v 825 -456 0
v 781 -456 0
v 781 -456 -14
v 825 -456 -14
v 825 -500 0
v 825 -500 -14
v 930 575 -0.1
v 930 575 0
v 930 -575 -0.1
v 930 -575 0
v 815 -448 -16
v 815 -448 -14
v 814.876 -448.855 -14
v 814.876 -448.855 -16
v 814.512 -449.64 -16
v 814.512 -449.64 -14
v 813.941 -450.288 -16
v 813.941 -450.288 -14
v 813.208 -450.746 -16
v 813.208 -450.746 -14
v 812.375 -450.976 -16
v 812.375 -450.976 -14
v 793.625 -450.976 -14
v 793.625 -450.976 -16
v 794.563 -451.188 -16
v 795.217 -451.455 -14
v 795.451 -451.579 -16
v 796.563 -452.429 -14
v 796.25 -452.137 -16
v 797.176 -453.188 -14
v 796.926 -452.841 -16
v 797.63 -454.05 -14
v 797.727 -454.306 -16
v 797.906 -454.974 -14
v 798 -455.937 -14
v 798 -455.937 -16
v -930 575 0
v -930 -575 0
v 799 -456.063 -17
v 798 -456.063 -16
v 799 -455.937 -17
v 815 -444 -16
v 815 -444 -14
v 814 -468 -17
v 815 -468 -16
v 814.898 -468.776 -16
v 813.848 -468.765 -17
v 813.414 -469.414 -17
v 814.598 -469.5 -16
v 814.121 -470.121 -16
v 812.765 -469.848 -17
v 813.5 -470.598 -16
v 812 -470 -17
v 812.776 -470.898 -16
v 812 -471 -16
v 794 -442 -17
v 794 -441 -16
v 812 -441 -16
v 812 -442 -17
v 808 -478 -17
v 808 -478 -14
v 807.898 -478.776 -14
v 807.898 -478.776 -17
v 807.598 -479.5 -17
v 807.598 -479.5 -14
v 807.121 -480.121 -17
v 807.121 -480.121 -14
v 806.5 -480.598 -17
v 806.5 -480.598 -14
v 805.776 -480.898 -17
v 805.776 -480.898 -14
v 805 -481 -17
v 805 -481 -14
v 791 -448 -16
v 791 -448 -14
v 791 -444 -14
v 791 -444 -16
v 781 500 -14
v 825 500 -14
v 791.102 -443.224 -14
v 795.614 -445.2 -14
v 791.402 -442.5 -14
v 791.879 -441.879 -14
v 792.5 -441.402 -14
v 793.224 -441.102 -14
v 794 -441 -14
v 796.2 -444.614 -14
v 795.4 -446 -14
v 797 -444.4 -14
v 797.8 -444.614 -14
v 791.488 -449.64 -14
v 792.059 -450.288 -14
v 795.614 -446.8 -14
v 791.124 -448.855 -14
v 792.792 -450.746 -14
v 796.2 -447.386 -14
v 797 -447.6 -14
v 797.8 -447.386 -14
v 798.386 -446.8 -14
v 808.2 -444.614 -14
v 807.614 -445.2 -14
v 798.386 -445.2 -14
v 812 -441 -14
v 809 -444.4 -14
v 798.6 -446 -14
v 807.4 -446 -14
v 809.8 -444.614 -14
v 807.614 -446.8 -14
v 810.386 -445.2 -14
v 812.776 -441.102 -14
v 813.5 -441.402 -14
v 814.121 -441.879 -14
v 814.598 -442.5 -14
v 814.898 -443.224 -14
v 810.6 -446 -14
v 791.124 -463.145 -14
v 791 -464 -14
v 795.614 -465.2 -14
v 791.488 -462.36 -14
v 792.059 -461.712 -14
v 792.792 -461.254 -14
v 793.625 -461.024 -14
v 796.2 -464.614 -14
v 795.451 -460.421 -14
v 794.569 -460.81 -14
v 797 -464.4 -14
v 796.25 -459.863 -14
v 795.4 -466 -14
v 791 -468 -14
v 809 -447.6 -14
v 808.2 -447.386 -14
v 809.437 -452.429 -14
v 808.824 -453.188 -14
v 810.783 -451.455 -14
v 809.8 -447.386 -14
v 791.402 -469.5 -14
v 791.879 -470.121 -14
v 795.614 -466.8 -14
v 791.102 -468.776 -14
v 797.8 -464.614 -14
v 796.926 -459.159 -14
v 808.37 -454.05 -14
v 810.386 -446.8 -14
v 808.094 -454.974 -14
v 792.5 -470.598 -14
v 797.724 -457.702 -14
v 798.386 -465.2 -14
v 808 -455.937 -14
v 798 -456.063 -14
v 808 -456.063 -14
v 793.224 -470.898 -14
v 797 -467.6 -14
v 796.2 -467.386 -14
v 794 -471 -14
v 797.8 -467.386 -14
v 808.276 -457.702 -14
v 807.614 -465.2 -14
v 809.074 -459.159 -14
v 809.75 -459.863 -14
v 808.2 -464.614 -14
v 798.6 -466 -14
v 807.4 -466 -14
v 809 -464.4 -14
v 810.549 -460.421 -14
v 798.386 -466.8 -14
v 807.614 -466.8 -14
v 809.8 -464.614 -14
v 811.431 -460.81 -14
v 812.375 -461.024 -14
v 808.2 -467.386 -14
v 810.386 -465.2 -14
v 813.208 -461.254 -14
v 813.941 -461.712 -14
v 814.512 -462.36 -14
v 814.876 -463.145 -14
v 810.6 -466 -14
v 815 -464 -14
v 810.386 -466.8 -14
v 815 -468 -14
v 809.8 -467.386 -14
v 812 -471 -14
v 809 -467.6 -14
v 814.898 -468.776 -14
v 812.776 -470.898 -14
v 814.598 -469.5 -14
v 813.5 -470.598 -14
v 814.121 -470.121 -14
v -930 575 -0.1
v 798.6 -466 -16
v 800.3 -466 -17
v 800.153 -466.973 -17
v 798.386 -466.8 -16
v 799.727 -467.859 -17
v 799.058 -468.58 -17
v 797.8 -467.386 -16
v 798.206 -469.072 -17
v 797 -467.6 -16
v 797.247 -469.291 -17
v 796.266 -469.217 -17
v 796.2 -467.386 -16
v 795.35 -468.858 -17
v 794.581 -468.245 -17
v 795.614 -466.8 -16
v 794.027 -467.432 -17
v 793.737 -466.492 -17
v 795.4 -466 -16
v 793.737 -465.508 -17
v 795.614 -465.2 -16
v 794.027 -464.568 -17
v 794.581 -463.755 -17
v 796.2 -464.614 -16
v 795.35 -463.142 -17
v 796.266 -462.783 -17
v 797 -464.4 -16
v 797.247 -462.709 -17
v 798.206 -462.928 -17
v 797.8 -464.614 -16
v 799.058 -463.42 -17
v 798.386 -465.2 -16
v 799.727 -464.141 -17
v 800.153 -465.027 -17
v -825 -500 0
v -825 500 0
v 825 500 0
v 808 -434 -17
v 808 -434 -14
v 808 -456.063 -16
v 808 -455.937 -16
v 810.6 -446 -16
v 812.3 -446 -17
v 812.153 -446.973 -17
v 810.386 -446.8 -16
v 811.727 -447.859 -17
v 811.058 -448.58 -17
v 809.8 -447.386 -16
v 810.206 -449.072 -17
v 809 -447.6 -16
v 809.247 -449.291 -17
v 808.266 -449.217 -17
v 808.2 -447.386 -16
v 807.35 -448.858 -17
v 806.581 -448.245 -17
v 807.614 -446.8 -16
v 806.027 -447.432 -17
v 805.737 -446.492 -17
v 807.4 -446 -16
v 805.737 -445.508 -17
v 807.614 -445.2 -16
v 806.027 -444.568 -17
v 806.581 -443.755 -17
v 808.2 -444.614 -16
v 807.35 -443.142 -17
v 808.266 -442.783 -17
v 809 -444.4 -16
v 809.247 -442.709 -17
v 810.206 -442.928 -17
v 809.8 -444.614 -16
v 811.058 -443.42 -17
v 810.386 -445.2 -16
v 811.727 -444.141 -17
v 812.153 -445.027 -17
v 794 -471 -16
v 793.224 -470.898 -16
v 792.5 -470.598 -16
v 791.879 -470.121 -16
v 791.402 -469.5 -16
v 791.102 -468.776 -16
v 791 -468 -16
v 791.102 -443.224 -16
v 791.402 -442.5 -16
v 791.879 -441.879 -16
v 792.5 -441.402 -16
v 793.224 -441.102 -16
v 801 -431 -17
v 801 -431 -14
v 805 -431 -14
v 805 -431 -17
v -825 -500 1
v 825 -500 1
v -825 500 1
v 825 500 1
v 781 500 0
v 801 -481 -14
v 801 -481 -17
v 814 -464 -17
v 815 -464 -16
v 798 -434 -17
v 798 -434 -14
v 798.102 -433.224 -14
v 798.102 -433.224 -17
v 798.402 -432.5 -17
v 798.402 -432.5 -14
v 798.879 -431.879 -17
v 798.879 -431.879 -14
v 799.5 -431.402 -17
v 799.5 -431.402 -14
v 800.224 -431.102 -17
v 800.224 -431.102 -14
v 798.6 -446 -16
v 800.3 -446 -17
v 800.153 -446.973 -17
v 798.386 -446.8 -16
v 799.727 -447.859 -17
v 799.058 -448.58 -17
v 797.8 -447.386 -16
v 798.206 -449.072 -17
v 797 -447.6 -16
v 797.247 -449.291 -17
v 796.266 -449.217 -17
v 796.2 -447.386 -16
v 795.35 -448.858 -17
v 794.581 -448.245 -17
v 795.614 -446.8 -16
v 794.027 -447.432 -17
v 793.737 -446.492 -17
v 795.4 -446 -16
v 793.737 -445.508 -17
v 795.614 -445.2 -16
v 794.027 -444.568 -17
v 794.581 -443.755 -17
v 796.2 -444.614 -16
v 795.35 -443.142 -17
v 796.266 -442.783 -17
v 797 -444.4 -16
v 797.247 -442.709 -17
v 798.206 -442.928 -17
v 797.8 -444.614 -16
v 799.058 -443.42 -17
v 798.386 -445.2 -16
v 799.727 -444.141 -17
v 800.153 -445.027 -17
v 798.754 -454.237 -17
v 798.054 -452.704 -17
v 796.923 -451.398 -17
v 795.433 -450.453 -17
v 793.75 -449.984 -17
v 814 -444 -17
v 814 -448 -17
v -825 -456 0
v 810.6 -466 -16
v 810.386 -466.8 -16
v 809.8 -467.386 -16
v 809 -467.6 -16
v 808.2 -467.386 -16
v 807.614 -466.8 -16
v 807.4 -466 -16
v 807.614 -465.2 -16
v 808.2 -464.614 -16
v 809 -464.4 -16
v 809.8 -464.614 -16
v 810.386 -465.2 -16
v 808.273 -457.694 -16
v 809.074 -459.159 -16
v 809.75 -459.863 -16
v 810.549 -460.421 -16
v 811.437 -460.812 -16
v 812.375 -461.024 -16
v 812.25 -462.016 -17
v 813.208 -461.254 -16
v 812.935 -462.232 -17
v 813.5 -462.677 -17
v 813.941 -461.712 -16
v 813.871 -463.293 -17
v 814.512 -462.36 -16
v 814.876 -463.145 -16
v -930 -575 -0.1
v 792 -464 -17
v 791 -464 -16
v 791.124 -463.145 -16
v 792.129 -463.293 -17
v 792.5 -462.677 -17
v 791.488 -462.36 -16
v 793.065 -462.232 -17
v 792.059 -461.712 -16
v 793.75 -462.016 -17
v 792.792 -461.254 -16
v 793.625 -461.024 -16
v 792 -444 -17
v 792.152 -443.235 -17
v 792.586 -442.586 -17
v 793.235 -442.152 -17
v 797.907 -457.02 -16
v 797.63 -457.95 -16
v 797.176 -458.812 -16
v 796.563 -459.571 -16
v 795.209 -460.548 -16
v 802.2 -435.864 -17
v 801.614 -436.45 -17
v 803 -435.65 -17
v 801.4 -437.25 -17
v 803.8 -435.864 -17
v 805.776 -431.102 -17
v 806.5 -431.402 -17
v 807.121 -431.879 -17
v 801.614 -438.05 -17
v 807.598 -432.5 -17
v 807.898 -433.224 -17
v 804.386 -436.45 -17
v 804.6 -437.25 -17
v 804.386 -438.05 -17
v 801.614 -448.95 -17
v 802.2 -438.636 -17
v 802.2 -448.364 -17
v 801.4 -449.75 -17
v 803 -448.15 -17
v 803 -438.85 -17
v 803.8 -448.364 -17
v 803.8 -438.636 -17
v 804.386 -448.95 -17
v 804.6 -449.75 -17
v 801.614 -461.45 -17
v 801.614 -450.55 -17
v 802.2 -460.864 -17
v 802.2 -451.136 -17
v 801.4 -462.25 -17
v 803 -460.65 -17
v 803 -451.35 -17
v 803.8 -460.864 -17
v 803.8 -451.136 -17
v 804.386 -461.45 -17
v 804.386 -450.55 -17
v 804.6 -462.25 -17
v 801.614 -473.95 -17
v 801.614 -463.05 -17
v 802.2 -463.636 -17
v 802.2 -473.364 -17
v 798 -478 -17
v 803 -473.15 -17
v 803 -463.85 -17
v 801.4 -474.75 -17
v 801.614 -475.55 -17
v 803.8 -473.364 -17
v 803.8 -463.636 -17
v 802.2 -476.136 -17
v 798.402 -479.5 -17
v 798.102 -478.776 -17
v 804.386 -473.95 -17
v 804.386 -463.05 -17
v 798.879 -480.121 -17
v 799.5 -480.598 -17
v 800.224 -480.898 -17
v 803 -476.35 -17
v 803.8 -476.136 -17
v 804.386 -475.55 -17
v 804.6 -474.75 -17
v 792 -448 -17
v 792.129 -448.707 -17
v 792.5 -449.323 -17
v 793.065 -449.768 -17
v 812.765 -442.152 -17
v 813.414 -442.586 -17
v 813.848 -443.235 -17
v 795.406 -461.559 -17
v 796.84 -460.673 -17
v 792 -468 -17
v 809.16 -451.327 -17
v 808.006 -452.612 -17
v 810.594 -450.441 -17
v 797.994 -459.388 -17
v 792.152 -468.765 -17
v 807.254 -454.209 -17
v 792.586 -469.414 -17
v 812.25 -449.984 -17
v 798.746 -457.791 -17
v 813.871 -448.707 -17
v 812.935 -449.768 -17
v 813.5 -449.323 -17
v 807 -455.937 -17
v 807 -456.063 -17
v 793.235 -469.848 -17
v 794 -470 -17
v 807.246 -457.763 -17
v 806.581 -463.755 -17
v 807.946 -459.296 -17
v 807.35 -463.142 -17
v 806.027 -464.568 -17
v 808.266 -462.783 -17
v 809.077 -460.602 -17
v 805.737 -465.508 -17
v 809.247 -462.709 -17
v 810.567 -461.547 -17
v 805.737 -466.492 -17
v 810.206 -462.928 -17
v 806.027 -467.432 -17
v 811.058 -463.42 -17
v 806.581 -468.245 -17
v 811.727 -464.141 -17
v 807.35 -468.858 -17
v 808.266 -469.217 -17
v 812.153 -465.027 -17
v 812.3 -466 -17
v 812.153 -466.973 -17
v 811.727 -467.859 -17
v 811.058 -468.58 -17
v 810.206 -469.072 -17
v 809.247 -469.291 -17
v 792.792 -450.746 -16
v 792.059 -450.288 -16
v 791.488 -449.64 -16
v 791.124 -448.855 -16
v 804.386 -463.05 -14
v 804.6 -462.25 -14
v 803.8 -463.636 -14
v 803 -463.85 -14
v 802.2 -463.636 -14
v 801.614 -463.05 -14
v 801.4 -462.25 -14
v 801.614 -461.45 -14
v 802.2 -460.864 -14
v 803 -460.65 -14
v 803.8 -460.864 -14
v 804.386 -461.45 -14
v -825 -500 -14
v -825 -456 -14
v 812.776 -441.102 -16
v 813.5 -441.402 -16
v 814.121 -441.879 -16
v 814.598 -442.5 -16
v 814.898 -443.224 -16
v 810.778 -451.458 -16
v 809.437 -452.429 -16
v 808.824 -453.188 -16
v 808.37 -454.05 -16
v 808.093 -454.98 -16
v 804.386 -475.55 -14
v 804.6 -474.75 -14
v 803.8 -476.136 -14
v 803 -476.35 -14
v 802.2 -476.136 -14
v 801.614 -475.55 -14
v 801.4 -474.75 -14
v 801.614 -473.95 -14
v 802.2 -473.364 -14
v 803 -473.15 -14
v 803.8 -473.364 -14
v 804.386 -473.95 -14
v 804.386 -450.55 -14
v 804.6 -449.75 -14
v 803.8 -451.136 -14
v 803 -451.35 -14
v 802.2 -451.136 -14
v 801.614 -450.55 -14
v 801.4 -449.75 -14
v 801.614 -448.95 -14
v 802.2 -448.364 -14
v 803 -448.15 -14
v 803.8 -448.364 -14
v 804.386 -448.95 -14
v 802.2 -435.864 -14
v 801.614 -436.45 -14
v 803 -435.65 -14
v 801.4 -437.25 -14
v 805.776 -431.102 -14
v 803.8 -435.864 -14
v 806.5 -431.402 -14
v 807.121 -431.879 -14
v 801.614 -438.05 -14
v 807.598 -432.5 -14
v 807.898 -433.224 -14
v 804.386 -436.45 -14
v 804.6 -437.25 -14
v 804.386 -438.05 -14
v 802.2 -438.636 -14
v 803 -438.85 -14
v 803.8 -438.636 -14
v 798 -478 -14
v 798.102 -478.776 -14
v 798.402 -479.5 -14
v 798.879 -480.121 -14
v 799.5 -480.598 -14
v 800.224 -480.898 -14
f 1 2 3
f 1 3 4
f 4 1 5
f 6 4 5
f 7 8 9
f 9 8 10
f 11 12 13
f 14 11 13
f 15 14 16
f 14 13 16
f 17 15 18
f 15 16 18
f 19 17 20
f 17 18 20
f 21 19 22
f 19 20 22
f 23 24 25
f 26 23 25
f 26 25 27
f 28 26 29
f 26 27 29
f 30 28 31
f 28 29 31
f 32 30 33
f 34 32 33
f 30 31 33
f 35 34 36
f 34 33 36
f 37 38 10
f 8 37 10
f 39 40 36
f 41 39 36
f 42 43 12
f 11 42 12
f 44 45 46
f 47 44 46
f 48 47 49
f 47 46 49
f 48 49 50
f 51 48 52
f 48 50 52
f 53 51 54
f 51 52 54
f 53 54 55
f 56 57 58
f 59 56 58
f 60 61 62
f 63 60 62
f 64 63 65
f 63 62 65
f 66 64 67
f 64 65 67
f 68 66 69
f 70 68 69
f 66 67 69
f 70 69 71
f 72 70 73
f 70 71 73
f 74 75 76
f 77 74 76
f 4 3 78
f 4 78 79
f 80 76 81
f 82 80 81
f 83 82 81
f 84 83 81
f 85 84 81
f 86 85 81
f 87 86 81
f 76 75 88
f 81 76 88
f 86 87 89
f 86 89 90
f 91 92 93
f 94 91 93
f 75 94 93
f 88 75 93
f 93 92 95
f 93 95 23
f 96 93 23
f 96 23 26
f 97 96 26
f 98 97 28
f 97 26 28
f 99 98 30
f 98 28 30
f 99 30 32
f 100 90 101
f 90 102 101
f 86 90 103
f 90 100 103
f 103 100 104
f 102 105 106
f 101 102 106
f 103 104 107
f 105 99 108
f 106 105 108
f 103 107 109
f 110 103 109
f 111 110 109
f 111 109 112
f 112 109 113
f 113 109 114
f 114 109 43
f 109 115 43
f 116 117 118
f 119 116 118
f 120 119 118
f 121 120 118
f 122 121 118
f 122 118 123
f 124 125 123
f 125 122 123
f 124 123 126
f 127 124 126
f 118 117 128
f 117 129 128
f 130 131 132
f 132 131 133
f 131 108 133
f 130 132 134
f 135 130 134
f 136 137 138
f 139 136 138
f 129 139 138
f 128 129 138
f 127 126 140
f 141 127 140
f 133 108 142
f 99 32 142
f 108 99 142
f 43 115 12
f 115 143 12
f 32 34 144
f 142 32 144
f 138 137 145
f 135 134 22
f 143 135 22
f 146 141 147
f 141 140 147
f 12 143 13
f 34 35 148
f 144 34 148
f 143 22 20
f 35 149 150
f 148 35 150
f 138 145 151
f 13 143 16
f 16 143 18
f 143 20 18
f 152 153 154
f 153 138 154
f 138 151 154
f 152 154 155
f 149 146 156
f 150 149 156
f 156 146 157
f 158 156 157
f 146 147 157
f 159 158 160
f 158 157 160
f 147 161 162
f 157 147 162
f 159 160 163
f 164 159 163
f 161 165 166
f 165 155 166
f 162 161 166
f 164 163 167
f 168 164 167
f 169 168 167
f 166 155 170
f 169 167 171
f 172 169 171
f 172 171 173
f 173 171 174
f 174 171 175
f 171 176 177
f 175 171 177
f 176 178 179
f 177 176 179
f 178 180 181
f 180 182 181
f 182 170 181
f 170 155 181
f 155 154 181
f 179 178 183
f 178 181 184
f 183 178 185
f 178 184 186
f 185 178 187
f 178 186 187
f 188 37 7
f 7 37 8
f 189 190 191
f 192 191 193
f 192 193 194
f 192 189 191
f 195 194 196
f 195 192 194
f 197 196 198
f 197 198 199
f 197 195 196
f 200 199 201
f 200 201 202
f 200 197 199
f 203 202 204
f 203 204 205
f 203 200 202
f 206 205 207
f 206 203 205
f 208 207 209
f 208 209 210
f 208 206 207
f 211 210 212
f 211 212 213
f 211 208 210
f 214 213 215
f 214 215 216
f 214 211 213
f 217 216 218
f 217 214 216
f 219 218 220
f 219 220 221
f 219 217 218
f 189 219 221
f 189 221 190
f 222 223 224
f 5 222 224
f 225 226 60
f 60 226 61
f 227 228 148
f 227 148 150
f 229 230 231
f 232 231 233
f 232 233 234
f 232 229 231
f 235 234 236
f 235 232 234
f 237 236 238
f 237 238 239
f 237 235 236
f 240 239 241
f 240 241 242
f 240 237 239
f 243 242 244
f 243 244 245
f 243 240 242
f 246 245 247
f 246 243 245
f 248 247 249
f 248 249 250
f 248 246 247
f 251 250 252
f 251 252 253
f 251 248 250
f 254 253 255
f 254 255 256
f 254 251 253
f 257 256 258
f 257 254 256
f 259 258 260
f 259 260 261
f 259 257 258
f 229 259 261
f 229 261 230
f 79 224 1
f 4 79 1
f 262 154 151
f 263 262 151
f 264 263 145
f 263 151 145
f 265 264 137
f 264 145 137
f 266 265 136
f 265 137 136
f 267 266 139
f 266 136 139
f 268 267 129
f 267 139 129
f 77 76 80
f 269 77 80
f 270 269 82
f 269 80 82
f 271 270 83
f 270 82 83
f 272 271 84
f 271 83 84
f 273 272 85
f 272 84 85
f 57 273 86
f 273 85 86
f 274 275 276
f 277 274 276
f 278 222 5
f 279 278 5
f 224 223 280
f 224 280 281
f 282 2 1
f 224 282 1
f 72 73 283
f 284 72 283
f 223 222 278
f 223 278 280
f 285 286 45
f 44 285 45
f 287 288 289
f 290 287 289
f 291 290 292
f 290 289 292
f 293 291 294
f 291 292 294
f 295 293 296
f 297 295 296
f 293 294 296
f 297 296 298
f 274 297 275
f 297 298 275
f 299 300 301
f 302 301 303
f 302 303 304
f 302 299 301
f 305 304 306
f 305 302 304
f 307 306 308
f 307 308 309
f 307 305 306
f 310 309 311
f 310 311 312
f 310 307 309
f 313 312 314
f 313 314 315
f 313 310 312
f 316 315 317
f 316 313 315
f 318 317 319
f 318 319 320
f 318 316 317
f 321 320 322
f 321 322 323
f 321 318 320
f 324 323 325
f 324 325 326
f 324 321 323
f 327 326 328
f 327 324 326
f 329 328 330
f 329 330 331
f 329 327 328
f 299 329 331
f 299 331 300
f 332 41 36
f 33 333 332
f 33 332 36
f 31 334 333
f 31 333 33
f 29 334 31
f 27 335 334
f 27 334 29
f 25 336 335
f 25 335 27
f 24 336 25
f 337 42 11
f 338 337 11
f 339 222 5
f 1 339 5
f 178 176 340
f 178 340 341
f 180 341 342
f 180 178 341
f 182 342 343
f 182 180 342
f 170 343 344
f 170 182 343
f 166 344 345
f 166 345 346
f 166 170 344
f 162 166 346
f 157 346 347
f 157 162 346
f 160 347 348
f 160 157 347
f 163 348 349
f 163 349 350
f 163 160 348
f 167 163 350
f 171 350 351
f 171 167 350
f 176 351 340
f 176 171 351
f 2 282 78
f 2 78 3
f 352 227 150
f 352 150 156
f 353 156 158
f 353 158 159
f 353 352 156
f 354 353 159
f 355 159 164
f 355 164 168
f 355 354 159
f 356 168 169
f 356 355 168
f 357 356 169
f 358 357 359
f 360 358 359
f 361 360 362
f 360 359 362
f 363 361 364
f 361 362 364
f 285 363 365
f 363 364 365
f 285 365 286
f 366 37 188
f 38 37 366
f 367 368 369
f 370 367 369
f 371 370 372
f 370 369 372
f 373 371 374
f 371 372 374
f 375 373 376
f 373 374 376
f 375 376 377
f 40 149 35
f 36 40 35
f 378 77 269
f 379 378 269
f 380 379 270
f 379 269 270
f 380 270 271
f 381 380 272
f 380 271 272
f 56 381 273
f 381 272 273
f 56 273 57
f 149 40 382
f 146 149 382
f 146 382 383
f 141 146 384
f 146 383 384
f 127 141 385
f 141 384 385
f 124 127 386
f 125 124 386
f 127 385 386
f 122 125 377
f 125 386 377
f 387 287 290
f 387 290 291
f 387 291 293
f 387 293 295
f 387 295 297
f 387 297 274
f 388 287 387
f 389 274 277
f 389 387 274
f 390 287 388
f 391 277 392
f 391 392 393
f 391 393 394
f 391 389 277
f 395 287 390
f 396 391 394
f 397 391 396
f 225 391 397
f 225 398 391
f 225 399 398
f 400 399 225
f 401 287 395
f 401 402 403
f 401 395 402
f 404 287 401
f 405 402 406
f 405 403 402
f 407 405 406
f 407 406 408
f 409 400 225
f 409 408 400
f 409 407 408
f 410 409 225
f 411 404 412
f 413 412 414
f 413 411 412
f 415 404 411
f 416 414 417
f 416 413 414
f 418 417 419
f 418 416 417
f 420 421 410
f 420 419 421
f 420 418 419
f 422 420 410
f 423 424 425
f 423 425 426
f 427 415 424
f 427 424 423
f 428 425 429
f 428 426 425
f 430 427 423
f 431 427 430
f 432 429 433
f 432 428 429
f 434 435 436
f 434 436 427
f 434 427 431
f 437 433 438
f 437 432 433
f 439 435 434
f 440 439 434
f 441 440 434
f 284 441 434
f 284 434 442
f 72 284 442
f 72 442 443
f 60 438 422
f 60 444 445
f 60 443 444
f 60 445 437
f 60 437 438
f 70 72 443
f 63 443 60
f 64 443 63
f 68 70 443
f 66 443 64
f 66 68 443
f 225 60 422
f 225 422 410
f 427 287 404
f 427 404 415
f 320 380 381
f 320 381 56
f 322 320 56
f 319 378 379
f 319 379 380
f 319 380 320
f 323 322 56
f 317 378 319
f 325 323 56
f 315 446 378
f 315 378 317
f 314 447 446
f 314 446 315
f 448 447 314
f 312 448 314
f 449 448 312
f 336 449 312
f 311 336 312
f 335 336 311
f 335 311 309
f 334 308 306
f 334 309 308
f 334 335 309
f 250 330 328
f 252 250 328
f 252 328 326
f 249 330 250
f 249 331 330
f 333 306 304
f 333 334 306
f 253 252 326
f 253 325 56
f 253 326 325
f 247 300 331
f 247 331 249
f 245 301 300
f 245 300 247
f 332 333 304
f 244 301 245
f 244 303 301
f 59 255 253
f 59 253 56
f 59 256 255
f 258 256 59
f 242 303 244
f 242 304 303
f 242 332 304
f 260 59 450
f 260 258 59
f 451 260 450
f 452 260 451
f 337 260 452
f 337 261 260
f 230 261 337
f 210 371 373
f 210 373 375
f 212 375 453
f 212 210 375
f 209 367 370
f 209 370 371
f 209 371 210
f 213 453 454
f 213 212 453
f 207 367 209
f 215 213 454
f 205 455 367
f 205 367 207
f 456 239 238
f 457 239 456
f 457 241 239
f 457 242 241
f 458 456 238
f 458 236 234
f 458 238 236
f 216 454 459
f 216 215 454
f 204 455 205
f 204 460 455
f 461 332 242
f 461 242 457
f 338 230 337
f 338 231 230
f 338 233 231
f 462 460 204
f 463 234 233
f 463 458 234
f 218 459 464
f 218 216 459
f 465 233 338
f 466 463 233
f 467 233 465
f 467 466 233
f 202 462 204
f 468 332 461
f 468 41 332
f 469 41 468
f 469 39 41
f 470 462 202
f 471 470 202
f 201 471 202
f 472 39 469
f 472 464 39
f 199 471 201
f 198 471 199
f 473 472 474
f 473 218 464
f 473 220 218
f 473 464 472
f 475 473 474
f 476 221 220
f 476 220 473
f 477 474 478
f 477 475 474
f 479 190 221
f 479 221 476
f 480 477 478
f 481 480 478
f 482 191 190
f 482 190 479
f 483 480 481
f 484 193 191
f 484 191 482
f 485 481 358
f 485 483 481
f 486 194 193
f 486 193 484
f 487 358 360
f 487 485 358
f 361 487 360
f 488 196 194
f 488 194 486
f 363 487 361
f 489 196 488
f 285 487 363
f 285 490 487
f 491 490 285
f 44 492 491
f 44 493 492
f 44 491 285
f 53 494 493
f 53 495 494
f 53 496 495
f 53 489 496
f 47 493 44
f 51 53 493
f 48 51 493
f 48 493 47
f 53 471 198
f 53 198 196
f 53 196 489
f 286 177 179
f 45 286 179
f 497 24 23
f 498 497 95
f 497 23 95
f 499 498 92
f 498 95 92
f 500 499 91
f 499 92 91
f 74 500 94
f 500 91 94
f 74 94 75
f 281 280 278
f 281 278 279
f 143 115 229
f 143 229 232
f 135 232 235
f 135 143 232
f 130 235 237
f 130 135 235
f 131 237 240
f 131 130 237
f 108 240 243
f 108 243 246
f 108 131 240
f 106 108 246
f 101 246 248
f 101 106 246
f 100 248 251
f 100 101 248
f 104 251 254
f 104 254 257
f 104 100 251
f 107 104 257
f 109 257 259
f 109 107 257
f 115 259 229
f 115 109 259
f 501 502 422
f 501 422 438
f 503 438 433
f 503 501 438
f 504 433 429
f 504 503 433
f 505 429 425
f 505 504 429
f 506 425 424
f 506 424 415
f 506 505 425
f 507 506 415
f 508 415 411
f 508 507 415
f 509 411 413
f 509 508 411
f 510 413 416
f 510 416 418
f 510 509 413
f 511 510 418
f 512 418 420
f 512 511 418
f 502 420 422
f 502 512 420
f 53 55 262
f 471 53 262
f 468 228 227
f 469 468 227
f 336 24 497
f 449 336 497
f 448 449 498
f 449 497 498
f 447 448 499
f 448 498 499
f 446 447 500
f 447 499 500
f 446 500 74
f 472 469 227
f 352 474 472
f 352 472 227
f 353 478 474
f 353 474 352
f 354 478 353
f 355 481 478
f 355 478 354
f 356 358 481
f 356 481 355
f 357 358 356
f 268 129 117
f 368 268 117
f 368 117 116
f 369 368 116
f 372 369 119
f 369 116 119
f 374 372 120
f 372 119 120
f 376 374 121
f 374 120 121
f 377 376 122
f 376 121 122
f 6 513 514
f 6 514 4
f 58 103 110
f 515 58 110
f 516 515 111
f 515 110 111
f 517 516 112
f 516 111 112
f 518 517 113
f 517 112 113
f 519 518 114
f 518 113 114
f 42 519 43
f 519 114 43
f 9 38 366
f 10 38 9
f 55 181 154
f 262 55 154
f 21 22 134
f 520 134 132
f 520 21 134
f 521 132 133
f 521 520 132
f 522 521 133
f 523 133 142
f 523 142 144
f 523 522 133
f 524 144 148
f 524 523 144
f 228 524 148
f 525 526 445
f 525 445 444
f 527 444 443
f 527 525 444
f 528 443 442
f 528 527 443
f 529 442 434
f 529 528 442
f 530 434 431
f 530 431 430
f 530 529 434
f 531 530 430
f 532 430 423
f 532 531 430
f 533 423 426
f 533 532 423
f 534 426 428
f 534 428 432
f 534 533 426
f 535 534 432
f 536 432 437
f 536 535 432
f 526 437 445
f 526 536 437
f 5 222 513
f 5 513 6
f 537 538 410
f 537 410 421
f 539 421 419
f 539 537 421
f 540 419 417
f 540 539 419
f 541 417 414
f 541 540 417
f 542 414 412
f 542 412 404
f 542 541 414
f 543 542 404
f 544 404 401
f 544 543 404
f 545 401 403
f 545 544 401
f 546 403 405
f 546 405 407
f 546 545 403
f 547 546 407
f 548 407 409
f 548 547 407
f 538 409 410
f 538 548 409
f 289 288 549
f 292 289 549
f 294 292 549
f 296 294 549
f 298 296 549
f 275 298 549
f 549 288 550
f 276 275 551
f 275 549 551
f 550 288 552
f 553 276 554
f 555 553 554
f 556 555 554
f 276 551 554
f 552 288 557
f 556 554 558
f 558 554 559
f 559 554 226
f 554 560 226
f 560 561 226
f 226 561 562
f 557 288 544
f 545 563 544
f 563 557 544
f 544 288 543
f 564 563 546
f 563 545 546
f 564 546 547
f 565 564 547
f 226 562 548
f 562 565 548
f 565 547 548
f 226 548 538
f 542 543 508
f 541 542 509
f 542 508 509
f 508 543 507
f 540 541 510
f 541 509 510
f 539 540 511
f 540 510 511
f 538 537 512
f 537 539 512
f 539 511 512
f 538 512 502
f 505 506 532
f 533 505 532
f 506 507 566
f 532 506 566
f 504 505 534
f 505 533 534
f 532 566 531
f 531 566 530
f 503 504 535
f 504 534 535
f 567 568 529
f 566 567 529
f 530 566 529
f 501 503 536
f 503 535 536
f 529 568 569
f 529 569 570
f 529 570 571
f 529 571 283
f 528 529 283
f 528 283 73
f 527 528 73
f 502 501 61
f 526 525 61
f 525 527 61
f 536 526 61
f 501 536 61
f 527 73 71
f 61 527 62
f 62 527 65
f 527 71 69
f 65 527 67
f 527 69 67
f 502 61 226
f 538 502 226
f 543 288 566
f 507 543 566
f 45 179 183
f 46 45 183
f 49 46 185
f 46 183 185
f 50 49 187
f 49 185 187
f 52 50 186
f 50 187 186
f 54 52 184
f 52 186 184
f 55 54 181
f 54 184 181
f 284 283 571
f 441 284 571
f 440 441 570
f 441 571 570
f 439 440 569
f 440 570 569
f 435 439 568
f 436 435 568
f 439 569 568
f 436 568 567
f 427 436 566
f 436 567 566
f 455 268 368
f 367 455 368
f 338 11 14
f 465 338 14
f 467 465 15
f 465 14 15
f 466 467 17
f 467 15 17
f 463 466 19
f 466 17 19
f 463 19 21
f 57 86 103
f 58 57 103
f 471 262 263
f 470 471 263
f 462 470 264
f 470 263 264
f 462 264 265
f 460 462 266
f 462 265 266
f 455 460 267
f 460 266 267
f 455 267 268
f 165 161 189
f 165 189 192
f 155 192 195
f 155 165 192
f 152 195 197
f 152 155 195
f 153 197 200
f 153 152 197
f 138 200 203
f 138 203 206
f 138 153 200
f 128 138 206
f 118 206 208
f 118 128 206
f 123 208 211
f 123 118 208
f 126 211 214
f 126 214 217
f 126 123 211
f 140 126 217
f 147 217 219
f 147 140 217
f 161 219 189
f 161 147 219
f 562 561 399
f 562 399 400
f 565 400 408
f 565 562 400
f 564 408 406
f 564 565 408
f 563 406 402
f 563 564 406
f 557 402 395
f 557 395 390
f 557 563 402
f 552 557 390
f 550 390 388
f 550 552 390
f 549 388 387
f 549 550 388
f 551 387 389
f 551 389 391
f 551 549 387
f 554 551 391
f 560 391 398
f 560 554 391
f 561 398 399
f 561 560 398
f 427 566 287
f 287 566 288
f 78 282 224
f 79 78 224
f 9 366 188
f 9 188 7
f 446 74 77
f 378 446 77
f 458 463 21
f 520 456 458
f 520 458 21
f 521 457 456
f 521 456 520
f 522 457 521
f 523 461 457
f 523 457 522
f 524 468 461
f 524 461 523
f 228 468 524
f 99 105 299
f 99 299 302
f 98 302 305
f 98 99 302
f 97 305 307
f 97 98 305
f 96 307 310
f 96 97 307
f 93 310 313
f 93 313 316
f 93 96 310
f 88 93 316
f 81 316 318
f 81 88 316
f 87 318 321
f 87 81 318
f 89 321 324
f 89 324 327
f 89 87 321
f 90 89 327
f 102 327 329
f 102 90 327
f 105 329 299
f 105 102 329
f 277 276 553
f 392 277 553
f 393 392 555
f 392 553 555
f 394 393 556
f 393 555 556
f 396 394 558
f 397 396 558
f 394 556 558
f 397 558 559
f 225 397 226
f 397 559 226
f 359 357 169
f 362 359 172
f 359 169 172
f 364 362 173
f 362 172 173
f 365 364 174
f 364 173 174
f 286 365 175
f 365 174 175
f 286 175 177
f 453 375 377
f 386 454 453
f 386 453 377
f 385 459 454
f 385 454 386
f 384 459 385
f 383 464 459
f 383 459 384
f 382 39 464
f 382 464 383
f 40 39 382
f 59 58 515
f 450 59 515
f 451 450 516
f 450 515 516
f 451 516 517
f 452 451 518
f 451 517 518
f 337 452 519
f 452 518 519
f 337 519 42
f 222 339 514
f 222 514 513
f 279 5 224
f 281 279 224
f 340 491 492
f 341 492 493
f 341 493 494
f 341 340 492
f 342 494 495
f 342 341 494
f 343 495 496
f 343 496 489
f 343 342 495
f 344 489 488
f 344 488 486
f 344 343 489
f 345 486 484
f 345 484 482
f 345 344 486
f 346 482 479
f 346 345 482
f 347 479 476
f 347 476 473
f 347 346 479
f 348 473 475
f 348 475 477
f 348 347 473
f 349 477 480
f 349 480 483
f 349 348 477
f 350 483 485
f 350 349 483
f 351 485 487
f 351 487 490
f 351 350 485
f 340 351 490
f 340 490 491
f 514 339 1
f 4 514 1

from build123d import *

# Parameters (mm, degrees)
F0_W      = 1650
F0_H      = 1000
F1_DEPTH  = 1
F2_W      = 1860
F2_H      = 1150
F3_DEPTH  = 0.1
F4_W      = 1650
F4_H      = 44
F5_DEPTH  = 14
F6_W      = 44
F6_H      = 956
F7_DEPTH  = 14
F8_R      = 1.6
F9_DEPTH  = 3
F10_R     = 1.6
F11_DEPTH = 3
F12_R     = 5
F13_SIZE2 = 1
F13_SIZE  = 1.7
F14_SIZE  = 1


with BuildPart() as f1:
    # F0 (on Top) → F1 (new body)
    with BuildSketch(Plane.XY):
        Rectangle(F0_W, F0_H)
    extrude(amount=F1_DEPTH)


with BuildPart() as f3:
    # F2 (on face) → F3 (new body)
    with BuildSketch(Plane(origin=(0, 0, 0), x_dir=(1, 0, 0), z_dir=(0, 0, -1))):
        Rectangle(F2_W, F2_H)
    extrude(amount=F3_DEPTH)


with BuildPart() as f5:
    # F4 (on face) → F5 (new body)
    with BuildSketch(Plane(origin=(0, 0, 0), x_dir=(1, 0, 0), z_dir=(0, 0, -1))):
        with Locations((0, 478)):
            Rectangle(F4_W, F4_H)
    extrude(amount=F5_DEPTH)


with BuildPart() as f7:
    # F6 (on face) → F7 (new body)
    with BuildSketch(Plane(origin=(0, 0, 0), x_dir=(1, 0, 0), z_dir=(0, 0, -1))):
        with Locations((803, -22)):
            Rectangle(F6_W, F6_H)
    extrude(amount=F7_DEPTH)


with BuildPart() as f9:
    # F8 (on face) → F9 (new body)
    with BuildSketch(Plane(origin=(0, 0, -14), x_dir=(1, 0, 0), z_dir=(0, 0, -1))):
        with BuildLine():
            ThreePointArc((798, 434), (798.87868, 431.87868), (801, 431))
            Line((801, 431), (805, 431))
            ThreePointArc((805, 431), (807.12132, 431.87868), (808, 434))
            Line((808, 434), (808, 456))
            Line((808, 456), (808, 478))
            ThreePointArc((808, 478), (807.12132, 480.12132), (805, 481))
            Line((805, 481), (801, 481))
            ThreePointArc((801, 481), (798.87868, 480.12132), (798, 478))
            Line((798, 478), (798, 456))
            Line((798, 456), (798, 434))
        make_face()
        with Locations((803, 437.25)):
            Circle(F8_R, mode=Mode.SUBTRACT)
        with Locations((803, 449.75)):
            Circle(F8_R, mode=Mode.SUBTRACT)
        with Locations((803, 462.25)):
            Circle(F8_R, mode=Mode.SUBTRACT)
        with Locations((803, 474.75)):
            Circle(F8_R, mode=Mode.SUBTRACT)
    extrude(amount=F9_DEPTH)


with BuildPart() as f11:
    # F10 (on face) → F11 (new body)
    with BuildSketch(Plane(origin=(0, 0, -14), x_dir=(1, 0, 0), z_dir=(0, 0, -1))):
        with BuildLine():
            Line((798, 451), (794, 451))
            ThreePointArc((794, 451), (791.87868, 450.12132), (791, 448))
            Line((791, 448), (791, 444))
            ThreePointArc((791, 444), (791.87868, 441.87868), (794, 441))
            Line((794, 441), (812, 441))
            ThreePointArc((812, 441), (814.12132, 441.87868), (815, 444))
            Line((815, 444), (815, 448))
            ThreePointArc((815, 448), (814.12132, 450.12132), (812, 451))
            Line((812, 451), (808, 451))
            Line((808, 451), (808, 456))
            Line((808, 456), (798, 456))
            Line((798, 456), (798, 451))
        make_face()
        with Locations((797, 446)):
            Circle(F10_R, mode=Mode.SUBTRACT)
        with Locations((809, 446)):
            Circle(F10_R, mode=Mode.SUBTRACT)
        with BuildLine():
            Line((798, 461), (798, 456))
            Line((798, 456), (808, 456))
            Line((808, 456), (808, 461))
            Line((808, 461), (812, 461))
            ThreePointArc((812, 461), (814.12132, 461.87868), (815, 464))
            Line((815, 464), (815, 468))
            ThreePointArc((815, 468), (814.12132, 470.12132), (812, 471))
            Line((812, 471), (794, 471))
            ThreePointArc((794, 471), (791.87868, 470.12132), (791, 468))
            Line((791, 468), (791, 464))
            ThreePointArc((791, 464), (791.87868, 461.87868), (794, 461))
            Line((794, 461), (798, 461))
        make_face()
        with Locations((797, 466)):
            Circle(F10_R, mode=Mode.SUBTRACT)
        with Locations((809, 466)):
            Circle(F10_R, mode=Mode.SUBTRACT)
    extrude(amount=F11_DEPTH)

    # F12
    f12_edges = [f11.edges().sort_by_distance(p)[0] for p in [
        (808, -461, -15.5),
        (808, -451, -15.5),
        (798, -461, -15.5),
        (798, -451, -15.5),
    ]]
    fillet(f12_edges, radius=F12_R)

    # F13
    f13_edges = [f11.edges().sort_by_distance(p)[0] for p in [
        (807.4, -446, -17),
        (795.4, -446, -17),
        (807.4, -466, -17),
        (795.4, -466, -17),
    ]]
    chamfer(f13_edges, length=F13_SIZE, length2=F13_SIZE2)

    # F14
    f14_edges = [f11.edges().sort_by_distance(p)[0] for p in [
        (814.12132, -441.87868, -17),
    ]]
    chamfer(f14_edges, length=F14_SIZE)


solid = Compound([f1.part, f3.part, f5.part, f7.part, f9.part, f11.part])
